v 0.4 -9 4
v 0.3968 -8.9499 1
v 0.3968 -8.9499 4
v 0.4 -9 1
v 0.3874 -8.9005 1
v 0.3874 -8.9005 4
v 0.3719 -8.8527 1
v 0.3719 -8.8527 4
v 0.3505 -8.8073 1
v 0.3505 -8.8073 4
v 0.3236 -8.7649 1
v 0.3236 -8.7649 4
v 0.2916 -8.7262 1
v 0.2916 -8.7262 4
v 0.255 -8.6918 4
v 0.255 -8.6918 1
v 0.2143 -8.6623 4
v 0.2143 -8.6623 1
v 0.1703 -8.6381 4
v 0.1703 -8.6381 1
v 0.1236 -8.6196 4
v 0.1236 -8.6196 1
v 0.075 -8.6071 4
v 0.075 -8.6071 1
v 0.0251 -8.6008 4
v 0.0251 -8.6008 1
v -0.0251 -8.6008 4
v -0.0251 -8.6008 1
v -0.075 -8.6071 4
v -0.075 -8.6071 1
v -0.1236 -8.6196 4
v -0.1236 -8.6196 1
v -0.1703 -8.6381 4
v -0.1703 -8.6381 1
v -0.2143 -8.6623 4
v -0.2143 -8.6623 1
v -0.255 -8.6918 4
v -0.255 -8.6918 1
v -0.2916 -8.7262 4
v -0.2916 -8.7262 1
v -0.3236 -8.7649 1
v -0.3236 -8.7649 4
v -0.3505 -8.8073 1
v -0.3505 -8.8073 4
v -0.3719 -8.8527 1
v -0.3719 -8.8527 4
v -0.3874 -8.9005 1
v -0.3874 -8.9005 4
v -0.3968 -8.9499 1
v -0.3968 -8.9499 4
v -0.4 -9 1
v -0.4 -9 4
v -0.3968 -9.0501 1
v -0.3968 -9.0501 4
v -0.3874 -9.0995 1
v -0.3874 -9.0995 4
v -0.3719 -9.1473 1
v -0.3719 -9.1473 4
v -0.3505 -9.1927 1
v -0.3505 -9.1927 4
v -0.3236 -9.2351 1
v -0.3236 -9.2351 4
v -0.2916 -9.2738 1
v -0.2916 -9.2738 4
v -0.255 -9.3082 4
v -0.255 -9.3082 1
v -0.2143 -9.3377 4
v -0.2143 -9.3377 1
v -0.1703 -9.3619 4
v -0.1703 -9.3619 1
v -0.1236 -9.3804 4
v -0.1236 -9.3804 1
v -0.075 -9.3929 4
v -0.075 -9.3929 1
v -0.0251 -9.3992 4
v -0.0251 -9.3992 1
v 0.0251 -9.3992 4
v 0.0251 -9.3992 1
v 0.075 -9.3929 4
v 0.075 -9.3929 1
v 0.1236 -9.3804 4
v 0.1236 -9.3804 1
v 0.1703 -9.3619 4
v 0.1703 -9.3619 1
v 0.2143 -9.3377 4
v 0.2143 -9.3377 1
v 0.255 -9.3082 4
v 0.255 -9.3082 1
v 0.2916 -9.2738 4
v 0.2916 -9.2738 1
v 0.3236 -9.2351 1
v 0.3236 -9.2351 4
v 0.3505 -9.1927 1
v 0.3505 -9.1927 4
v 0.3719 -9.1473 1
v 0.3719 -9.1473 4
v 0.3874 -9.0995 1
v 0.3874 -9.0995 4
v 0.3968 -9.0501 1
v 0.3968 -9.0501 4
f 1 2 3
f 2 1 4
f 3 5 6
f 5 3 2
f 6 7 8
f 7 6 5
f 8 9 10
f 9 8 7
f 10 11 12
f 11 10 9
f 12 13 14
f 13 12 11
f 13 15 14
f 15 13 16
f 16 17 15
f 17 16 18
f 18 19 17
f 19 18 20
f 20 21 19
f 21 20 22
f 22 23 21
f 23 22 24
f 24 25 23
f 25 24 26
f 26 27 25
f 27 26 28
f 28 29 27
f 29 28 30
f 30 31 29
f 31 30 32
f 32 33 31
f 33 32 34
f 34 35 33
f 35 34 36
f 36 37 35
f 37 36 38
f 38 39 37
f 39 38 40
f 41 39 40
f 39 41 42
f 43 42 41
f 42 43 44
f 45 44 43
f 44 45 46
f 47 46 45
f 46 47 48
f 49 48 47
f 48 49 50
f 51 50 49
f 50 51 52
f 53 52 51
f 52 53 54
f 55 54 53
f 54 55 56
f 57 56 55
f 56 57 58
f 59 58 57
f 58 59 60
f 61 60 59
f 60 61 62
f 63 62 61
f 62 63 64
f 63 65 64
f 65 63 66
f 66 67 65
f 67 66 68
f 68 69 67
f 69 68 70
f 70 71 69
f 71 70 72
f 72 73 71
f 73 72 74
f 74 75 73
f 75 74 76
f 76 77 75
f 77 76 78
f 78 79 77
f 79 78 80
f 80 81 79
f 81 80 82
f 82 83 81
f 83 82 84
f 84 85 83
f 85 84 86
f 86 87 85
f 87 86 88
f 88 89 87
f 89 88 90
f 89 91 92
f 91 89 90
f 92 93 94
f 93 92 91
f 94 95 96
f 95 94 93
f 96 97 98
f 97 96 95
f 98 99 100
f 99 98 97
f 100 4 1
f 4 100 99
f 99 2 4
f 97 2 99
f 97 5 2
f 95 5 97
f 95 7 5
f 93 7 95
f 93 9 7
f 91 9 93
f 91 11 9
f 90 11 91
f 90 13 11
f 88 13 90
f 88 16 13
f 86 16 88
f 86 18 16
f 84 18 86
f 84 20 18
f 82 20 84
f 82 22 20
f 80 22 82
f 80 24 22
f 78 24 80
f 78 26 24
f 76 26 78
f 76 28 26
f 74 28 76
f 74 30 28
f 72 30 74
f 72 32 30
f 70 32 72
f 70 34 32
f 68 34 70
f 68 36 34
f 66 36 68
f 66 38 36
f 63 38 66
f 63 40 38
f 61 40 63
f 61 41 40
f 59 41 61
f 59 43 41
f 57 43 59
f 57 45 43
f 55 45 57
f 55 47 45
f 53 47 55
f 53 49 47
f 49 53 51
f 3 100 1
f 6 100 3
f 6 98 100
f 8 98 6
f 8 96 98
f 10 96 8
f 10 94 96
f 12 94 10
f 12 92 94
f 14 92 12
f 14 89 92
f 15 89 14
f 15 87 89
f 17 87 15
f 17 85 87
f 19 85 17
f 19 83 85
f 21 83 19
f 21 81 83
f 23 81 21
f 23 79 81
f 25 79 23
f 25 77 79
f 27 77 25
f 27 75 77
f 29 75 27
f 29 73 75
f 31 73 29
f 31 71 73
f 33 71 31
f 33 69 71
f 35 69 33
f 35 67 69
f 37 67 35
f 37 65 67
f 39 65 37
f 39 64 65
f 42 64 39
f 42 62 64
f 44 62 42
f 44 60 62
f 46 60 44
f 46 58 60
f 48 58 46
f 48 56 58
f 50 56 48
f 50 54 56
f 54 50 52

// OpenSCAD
translate([0,0,0.8])
	linear_extrude(height=2.4, center=true)
    	import("../dxf/steamengine_wheels.dxf", $fn=50);
translate([0,0,-0.2])
	linear_extrude(height=0.4, center=true)
    	import("../dxf/steamengine_wheels_int.dxf", $fn=50);

translate([0,-9,1])
	cylinder(3,0.4, 0.4, $fn=50);
